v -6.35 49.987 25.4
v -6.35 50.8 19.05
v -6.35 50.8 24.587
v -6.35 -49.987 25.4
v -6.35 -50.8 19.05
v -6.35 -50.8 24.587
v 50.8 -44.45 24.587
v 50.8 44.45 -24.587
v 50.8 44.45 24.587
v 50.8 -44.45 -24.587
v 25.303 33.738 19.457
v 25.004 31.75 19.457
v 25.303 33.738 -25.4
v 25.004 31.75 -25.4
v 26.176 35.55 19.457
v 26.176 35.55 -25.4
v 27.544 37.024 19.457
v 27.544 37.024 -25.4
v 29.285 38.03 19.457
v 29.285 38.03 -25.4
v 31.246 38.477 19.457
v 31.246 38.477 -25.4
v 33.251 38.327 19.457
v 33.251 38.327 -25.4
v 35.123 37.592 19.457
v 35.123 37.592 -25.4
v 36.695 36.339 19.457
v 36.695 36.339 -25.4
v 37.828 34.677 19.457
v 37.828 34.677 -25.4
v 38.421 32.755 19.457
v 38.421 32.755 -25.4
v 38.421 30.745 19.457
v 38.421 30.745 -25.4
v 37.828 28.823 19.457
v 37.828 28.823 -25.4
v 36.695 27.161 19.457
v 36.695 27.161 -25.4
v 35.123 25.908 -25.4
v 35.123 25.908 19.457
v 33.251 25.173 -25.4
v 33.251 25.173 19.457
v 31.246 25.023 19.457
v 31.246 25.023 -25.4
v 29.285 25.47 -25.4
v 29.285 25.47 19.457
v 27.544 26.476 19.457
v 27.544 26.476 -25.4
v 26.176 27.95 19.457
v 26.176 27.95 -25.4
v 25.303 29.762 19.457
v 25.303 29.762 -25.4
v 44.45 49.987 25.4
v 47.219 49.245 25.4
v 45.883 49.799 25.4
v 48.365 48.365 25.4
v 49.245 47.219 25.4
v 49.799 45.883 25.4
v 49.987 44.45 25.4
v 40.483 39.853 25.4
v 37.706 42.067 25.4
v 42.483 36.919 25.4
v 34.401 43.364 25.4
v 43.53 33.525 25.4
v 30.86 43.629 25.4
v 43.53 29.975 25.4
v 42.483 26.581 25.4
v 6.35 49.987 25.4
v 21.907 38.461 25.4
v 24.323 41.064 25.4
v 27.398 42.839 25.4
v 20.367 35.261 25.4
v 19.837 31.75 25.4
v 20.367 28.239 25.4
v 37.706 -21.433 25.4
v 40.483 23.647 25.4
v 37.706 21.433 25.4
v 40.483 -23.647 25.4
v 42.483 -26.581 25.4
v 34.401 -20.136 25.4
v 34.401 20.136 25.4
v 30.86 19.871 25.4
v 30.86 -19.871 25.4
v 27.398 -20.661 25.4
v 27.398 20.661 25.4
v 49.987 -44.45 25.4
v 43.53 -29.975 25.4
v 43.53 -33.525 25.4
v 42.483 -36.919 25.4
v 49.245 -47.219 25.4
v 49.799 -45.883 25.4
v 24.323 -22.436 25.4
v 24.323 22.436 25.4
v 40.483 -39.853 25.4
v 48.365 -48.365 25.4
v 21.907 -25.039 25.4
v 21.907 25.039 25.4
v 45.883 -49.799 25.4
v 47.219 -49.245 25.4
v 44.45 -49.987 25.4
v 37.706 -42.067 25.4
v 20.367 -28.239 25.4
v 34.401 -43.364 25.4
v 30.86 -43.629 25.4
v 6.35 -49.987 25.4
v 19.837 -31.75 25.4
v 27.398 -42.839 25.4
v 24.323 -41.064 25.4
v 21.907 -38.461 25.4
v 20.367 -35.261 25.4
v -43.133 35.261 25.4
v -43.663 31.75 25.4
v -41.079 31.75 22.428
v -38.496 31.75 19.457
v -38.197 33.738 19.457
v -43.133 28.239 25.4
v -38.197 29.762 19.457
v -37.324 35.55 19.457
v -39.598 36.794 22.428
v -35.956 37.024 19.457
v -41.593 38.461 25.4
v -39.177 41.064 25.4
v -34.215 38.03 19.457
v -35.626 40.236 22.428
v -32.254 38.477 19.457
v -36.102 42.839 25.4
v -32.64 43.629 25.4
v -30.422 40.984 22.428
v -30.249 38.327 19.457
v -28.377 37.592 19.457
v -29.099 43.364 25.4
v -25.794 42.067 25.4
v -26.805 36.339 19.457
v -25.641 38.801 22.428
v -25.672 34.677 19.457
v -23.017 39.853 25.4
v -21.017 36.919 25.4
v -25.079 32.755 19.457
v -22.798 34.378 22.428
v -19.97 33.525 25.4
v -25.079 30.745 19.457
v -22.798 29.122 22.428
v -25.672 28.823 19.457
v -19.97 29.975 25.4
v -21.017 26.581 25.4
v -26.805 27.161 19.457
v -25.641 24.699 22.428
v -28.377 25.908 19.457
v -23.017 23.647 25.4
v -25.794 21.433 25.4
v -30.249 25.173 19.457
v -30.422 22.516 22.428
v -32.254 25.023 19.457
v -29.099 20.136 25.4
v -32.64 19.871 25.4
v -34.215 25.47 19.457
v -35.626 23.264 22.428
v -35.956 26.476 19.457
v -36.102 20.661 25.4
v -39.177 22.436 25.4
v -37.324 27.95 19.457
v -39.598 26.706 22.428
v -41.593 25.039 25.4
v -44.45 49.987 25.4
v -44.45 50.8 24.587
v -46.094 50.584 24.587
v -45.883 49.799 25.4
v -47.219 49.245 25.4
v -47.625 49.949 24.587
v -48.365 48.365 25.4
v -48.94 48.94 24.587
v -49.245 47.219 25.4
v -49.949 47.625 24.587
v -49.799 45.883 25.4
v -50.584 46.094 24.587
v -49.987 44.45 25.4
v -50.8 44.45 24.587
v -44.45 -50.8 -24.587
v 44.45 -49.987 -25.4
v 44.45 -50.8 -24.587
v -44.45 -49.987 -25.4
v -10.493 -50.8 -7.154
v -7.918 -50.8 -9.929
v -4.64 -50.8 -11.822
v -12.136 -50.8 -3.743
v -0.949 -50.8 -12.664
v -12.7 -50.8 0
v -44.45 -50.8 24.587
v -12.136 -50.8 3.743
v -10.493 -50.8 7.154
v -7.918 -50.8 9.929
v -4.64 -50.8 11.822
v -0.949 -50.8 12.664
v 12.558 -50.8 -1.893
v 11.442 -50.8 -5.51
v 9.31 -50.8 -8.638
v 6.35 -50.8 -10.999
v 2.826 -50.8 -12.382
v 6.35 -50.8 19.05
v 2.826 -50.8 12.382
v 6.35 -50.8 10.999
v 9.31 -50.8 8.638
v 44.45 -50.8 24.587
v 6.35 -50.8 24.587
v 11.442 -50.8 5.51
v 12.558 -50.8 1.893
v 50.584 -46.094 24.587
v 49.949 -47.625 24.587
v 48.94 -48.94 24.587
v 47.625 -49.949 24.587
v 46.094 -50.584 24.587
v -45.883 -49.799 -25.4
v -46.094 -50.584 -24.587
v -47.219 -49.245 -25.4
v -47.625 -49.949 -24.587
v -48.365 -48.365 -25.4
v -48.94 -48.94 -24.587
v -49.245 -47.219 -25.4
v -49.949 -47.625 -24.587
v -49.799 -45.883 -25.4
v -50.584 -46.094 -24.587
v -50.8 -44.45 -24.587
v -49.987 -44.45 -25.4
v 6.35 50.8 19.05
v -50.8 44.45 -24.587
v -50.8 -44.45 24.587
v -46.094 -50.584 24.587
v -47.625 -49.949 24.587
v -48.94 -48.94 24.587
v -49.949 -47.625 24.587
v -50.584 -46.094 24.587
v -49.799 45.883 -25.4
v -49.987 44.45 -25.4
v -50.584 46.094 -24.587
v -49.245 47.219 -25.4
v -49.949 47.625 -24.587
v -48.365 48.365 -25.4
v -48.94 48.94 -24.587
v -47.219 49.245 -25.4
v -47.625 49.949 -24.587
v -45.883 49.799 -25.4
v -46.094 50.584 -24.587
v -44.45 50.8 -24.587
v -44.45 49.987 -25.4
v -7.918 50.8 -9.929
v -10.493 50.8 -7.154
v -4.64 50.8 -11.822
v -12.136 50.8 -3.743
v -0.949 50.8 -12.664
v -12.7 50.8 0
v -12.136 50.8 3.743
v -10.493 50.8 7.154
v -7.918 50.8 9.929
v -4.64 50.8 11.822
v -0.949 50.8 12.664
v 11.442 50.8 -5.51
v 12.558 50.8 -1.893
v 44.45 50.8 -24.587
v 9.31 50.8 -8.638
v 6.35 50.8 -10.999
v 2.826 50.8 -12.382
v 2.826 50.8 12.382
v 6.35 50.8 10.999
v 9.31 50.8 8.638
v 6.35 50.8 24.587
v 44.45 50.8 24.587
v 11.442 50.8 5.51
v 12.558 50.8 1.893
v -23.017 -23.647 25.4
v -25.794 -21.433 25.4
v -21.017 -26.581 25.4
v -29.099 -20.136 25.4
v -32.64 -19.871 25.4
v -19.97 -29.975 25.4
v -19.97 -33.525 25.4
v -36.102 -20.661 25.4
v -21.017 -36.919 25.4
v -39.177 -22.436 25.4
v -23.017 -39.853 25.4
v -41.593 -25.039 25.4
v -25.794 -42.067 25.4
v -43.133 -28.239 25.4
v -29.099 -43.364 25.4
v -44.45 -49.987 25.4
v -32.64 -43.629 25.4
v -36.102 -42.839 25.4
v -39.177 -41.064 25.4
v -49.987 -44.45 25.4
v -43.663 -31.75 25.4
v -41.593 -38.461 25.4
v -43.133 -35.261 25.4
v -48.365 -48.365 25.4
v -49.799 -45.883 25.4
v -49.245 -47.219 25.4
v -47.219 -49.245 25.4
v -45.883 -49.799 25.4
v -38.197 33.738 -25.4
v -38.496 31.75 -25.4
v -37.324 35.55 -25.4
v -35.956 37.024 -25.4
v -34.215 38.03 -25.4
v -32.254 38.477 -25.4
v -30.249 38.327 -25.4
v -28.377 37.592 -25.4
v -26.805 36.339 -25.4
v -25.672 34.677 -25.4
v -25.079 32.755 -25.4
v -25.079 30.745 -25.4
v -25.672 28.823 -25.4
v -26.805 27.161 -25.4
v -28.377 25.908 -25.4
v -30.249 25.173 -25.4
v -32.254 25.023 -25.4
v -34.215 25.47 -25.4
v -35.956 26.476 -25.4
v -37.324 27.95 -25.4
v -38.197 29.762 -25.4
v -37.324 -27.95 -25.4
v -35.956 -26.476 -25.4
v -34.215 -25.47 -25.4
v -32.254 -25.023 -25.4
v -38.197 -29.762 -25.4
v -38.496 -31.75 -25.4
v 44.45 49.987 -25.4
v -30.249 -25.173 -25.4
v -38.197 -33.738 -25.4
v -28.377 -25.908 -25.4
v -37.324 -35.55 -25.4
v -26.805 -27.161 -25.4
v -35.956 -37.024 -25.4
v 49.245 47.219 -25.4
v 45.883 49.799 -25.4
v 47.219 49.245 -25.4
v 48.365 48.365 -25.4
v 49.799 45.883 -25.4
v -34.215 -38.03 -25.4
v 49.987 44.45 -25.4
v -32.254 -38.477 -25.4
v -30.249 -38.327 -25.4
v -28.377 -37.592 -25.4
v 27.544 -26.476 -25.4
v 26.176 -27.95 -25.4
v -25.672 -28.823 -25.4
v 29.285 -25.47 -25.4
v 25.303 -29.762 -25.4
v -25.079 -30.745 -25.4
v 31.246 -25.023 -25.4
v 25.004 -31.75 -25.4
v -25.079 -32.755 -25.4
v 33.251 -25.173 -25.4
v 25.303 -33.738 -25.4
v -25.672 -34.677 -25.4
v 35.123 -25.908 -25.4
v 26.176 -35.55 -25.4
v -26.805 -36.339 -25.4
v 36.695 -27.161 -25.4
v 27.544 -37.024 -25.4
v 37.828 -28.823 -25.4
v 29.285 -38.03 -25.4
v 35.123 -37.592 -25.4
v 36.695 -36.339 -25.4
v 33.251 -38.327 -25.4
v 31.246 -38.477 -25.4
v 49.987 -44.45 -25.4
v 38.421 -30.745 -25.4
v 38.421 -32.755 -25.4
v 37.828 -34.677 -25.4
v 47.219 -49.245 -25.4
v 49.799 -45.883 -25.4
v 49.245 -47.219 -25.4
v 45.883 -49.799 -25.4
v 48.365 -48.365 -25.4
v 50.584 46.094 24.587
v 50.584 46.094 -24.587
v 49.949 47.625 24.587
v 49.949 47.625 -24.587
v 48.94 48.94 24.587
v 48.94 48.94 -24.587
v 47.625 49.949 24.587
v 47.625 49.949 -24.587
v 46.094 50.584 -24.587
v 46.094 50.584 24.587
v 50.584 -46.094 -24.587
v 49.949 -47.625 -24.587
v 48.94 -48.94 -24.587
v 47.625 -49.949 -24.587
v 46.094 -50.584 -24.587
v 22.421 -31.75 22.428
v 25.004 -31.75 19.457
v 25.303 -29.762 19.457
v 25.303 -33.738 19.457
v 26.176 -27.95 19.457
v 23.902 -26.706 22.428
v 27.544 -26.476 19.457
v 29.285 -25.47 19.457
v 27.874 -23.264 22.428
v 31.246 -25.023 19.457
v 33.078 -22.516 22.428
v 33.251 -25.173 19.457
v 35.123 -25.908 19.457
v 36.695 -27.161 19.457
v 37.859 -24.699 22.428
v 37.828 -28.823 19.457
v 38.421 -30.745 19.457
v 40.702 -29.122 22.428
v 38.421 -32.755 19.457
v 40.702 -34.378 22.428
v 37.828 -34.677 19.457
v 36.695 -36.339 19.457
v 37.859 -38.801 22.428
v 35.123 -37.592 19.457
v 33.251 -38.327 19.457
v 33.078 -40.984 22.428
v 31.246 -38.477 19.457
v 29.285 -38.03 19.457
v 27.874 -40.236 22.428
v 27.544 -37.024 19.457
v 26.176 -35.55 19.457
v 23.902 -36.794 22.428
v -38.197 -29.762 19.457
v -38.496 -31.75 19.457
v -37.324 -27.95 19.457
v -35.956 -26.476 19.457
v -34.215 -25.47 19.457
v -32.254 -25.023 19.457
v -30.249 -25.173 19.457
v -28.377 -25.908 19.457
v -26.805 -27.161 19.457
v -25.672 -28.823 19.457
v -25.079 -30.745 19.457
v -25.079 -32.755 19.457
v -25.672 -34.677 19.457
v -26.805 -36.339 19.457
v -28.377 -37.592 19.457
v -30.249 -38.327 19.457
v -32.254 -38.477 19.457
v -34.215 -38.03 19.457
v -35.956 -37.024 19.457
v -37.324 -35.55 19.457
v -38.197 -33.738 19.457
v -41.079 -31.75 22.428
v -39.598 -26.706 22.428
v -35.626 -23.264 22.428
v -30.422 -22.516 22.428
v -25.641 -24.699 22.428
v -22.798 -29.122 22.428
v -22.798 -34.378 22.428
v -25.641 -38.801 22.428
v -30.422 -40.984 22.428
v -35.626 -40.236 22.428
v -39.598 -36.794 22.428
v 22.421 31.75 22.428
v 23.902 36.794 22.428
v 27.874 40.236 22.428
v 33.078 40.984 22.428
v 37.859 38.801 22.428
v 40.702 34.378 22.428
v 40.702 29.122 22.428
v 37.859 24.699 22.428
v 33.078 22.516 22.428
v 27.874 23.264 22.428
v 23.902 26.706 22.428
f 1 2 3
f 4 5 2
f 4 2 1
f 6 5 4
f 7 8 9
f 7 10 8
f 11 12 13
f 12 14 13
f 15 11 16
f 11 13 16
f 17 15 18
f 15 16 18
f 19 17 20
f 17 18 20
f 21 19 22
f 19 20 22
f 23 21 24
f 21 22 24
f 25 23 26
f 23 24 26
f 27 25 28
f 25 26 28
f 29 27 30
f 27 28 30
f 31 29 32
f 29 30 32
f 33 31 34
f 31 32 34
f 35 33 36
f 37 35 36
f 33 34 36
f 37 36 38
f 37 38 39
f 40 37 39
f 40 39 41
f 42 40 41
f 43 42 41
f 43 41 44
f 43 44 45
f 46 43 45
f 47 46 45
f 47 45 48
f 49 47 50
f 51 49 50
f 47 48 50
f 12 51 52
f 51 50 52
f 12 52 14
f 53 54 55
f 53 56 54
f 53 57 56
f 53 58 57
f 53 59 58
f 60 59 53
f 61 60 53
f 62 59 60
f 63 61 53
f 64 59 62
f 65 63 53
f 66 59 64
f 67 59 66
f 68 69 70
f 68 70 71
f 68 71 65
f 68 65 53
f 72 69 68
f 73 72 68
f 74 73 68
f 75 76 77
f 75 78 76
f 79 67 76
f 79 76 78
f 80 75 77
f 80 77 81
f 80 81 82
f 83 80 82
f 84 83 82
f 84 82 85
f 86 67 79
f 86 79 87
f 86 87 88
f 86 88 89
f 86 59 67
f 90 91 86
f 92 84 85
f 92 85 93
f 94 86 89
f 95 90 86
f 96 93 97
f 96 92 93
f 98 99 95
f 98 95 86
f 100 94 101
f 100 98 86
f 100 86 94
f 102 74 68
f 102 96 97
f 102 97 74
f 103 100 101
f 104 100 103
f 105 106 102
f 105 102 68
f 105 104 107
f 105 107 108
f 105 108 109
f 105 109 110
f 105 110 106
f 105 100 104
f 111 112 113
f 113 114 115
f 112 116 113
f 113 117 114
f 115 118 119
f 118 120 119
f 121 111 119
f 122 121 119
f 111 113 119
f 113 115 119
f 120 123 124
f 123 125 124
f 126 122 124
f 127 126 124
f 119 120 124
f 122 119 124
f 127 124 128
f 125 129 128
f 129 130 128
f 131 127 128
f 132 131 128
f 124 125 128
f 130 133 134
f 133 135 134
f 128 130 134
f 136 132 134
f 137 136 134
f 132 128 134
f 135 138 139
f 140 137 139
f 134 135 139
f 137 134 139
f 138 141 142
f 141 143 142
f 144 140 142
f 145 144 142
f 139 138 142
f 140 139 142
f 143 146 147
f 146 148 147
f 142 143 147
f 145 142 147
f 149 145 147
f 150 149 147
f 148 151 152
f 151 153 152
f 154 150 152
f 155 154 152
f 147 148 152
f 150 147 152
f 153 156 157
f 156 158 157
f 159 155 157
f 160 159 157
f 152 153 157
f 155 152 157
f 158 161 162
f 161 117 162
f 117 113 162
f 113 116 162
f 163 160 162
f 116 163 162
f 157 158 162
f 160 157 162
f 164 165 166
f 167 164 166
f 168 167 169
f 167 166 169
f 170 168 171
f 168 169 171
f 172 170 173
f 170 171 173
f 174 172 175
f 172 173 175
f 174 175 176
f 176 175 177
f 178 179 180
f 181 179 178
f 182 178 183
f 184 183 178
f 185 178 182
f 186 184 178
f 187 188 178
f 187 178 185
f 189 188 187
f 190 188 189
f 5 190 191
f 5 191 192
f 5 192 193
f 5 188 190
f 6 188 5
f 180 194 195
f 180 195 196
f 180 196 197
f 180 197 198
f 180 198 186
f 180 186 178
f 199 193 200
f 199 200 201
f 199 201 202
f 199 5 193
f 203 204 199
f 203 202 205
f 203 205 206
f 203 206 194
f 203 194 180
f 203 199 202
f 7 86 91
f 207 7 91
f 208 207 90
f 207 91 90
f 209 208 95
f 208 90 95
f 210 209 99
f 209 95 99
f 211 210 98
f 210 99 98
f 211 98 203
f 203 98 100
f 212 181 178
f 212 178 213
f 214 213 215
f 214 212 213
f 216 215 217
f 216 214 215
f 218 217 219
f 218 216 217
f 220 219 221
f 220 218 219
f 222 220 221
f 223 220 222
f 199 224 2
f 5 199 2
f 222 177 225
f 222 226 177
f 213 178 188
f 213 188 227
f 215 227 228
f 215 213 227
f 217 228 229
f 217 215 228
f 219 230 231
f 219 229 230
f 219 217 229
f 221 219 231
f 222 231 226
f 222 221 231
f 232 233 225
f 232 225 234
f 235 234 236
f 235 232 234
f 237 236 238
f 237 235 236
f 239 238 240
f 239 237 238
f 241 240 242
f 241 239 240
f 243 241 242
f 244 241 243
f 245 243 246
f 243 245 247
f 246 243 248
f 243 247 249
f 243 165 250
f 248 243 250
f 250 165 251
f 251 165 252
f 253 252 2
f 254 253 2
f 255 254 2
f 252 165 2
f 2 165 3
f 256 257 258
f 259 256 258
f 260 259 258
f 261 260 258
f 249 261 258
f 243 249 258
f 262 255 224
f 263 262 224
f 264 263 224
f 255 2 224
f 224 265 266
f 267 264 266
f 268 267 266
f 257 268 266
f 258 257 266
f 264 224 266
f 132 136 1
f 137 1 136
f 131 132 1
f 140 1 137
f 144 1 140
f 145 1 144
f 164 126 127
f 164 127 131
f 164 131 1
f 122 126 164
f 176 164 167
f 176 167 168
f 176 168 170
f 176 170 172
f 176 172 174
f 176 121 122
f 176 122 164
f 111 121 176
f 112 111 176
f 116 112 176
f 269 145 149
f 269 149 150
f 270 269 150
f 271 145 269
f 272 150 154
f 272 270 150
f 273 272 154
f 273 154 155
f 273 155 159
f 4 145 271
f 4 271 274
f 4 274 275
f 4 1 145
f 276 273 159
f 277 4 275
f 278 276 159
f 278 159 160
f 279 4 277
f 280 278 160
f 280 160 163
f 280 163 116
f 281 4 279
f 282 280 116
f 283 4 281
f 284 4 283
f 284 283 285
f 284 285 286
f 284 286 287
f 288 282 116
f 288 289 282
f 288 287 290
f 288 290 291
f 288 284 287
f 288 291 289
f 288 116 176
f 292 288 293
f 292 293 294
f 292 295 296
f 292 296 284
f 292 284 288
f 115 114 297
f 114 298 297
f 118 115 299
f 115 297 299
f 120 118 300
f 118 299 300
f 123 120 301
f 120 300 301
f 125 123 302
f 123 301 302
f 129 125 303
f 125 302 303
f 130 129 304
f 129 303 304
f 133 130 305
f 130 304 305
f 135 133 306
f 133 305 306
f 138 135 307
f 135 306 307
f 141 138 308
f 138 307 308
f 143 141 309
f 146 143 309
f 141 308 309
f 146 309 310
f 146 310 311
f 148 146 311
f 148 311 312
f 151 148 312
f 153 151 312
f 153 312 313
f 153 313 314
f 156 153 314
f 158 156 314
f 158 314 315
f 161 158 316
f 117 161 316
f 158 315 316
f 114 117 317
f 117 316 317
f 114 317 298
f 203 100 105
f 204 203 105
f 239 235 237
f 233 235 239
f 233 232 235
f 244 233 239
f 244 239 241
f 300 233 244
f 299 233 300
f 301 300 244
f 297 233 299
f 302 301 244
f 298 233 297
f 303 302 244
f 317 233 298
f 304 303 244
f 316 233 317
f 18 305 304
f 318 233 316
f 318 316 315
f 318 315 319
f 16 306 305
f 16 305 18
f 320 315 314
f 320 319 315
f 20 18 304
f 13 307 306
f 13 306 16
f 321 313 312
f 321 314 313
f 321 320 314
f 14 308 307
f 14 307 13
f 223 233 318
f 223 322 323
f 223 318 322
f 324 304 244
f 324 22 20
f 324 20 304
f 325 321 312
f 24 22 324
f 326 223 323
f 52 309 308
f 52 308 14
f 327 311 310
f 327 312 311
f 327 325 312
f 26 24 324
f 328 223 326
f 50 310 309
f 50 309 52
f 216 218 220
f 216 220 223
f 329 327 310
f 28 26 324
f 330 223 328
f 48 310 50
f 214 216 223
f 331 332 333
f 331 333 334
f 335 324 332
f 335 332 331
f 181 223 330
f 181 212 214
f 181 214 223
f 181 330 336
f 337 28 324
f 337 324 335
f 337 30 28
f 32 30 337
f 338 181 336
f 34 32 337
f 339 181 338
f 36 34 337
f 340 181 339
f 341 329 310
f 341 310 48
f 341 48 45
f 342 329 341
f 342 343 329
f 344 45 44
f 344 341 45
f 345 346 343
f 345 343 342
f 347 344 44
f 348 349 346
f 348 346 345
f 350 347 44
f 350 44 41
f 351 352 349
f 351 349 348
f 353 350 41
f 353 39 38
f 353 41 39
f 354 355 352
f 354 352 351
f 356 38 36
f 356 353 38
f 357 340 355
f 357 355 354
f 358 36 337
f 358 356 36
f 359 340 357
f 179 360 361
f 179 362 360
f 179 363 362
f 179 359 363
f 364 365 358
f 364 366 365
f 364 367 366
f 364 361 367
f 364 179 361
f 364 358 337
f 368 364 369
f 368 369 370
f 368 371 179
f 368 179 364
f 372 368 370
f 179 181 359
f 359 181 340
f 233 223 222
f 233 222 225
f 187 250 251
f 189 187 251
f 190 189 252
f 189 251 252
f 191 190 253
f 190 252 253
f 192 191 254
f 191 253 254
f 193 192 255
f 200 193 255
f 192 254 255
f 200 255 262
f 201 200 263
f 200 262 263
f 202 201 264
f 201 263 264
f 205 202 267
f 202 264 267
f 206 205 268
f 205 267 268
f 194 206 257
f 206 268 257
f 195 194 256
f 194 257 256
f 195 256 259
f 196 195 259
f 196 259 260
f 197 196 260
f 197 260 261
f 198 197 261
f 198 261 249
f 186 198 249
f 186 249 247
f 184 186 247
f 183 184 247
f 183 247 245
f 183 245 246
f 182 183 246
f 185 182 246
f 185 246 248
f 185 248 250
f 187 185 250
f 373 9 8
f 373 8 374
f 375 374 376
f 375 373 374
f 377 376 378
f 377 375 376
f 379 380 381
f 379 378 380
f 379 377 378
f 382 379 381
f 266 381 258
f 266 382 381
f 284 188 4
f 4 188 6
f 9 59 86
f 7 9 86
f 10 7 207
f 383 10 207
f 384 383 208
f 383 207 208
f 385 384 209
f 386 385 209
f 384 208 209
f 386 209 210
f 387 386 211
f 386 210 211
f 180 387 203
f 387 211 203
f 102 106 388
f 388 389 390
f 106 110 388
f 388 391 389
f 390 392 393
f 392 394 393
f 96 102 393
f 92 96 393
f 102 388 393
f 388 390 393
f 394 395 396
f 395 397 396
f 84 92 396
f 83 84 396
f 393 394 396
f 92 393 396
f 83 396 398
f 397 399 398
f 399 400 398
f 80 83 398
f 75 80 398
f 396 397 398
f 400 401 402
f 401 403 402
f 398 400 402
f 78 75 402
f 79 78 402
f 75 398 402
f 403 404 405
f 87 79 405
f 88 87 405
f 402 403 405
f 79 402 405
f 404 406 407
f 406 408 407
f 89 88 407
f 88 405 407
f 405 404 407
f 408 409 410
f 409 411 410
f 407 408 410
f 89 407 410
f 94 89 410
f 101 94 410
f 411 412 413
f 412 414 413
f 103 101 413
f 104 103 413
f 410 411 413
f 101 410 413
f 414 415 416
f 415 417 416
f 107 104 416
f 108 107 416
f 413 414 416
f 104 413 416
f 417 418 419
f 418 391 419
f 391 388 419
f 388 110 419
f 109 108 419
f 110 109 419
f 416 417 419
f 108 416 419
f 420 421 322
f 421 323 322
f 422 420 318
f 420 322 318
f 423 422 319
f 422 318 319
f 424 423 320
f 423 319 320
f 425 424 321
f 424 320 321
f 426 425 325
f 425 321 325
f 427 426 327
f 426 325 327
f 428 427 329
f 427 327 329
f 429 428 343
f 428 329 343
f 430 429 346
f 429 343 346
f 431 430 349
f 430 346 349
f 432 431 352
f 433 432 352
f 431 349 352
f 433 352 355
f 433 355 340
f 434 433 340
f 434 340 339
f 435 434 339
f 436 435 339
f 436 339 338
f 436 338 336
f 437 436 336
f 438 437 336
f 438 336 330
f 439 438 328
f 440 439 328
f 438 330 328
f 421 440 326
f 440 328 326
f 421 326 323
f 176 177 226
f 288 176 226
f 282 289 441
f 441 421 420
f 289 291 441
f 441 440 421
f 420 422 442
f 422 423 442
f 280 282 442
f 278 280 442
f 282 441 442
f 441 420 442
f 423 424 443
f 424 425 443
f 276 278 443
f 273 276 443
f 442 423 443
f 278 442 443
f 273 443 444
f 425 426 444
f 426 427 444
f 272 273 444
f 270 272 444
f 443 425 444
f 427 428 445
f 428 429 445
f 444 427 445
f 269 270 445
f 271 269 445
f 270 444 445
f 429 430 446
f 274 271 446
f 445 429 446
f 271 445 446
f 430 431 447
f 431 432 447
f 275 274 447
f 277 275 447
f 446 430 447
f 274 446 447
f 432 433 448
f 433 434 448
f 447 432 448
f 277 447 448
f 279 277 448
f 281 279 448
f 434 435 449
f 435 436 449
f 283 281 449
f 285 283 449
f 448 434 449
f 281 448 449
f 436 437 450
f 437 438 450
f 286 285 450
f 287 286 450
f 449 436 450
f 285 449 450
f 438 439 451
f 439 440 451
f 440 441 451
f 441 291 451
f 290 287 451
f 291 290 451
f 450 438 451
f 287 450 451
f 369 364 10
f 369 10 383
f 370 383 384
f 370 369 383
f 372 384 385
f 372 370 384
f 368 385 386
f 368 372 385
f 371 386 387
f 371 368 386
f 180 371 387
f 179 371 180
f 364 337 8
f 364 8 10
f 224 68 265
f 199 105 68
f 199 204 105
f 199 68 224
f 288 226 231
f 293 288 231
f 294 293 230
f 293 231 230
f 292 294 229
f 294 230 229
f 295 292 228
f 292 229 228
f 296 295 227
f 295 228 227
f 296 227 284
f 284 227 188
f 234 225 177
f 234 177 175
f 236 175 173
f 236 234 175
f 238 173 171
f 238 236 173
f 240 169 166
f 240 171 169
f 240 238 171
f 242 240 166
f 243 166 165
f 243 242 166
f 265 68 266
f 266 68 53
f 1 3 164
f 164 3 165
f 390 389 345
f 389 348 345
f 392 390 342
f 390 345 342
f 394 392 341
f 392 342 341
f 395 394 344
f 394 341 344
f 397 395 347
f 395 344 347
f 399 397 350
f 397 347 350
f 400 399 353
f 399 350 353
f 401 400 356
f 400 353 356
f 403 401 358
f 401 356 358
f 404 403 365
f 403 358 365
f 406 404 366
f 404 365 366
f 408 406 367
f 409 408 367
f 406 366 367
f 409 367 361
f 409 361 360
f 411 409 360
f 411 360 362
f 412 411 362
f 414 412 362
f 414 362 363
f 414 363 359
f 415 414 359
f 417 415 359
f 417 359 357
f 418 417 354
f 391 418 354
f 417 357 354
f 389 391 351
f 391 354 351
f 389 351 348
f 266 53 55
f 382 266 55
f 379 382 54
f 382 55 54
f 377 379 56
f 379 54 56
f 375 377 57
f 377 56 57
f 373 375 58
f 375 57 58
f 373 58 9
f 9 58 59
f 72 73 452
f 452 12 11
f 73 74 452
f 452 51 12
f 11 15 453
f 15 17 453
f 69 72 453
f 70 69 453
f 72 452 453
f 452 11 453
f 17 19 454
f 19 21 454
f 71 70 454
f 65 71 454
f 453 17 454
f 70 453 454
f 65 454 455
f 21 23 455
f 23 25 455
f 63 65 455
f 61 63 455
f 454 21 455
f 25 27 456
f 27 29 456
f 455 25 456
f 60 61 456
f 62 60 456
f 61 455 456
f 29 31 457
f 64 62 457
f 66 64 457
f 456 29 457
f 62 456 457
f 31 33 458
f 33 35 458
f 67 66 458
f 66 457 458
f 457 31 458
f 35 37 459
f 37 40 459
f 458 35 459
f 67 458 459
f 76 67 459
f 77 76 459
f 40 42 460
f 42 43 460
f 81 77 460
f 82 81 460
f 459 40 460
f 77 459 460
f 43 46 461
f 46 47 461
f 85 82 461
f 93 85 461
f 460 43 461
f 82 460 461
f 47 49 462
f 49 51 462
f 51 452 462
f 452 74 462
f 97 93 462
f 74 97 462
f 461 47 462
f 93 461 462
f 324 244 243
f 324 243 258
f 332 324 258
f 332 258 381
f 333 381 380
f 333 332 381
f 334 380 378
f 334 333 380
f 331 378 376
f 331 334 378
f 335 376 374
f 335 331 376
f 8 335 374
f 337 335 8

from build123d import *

# Parameters (mm, degrees)
F1_DEPTH       = 50.8
F3_D           = 13.49248
F3_CSINK_D     = 23.8252
F3_CSINK_ANGLE = 82
F4_R           = 6.35
F5_SIZE        = 0.8128
F7_D           = 25.4


with BuildPart() as f1:
    # F0 (on Front) → F1 (new body, symmetric)
    with BuildSketch(Plane.XZ):
        Polygon((-6.35, 25.4), (-50.8, 25.4), (-50.8, -25.4), (50.8, -25.4), (50.8, 25.4), (6.35, 25.4), (6.35, 19.05), (-6.35, 19.05), align=None)
    extrude(amount=F1_DEPTH, both=True)

    # F3 (through all)
    with Locations(Plane.XY.offset(25.4)):
        with Locations((-31.75, 31.75), (31.75, 31.75), (31.75, -31.75), (-31.75, -31.75)):
            CounterSinkHole(F3_D / 2, F3_CSINK_D / 2, counter_sink_angle=F3_CSINK_ANGLE)

    # F4
    f4_edges = [f1.edges().sort_by_distance(p)[0] for p in [
        (50.8, -50.8, 0),
        (-50.8, -50.8, 0),
        (-50.8, 50.8, 0),
        (50.8, 50.8, 0),
    ]]
    fillet(f4_edges, radius=F4_R)

    # F5
    f5_edges = [f1.edges().sort_by_distance(p)[0] for p in [
        (25.4, -50.8, 25.4),
        (-50.8, 0, 25.4),
        (0, 50.8, -25.4),
    ]]
    chamfer(f5_edges, length=F5_SIZE)

    # F7 (through all)
    with Locations(Plane.XZ.offset(50.8)):
        with Locations((0, 0)):
            Hole(F7_D / 2)


solid = f1.part
